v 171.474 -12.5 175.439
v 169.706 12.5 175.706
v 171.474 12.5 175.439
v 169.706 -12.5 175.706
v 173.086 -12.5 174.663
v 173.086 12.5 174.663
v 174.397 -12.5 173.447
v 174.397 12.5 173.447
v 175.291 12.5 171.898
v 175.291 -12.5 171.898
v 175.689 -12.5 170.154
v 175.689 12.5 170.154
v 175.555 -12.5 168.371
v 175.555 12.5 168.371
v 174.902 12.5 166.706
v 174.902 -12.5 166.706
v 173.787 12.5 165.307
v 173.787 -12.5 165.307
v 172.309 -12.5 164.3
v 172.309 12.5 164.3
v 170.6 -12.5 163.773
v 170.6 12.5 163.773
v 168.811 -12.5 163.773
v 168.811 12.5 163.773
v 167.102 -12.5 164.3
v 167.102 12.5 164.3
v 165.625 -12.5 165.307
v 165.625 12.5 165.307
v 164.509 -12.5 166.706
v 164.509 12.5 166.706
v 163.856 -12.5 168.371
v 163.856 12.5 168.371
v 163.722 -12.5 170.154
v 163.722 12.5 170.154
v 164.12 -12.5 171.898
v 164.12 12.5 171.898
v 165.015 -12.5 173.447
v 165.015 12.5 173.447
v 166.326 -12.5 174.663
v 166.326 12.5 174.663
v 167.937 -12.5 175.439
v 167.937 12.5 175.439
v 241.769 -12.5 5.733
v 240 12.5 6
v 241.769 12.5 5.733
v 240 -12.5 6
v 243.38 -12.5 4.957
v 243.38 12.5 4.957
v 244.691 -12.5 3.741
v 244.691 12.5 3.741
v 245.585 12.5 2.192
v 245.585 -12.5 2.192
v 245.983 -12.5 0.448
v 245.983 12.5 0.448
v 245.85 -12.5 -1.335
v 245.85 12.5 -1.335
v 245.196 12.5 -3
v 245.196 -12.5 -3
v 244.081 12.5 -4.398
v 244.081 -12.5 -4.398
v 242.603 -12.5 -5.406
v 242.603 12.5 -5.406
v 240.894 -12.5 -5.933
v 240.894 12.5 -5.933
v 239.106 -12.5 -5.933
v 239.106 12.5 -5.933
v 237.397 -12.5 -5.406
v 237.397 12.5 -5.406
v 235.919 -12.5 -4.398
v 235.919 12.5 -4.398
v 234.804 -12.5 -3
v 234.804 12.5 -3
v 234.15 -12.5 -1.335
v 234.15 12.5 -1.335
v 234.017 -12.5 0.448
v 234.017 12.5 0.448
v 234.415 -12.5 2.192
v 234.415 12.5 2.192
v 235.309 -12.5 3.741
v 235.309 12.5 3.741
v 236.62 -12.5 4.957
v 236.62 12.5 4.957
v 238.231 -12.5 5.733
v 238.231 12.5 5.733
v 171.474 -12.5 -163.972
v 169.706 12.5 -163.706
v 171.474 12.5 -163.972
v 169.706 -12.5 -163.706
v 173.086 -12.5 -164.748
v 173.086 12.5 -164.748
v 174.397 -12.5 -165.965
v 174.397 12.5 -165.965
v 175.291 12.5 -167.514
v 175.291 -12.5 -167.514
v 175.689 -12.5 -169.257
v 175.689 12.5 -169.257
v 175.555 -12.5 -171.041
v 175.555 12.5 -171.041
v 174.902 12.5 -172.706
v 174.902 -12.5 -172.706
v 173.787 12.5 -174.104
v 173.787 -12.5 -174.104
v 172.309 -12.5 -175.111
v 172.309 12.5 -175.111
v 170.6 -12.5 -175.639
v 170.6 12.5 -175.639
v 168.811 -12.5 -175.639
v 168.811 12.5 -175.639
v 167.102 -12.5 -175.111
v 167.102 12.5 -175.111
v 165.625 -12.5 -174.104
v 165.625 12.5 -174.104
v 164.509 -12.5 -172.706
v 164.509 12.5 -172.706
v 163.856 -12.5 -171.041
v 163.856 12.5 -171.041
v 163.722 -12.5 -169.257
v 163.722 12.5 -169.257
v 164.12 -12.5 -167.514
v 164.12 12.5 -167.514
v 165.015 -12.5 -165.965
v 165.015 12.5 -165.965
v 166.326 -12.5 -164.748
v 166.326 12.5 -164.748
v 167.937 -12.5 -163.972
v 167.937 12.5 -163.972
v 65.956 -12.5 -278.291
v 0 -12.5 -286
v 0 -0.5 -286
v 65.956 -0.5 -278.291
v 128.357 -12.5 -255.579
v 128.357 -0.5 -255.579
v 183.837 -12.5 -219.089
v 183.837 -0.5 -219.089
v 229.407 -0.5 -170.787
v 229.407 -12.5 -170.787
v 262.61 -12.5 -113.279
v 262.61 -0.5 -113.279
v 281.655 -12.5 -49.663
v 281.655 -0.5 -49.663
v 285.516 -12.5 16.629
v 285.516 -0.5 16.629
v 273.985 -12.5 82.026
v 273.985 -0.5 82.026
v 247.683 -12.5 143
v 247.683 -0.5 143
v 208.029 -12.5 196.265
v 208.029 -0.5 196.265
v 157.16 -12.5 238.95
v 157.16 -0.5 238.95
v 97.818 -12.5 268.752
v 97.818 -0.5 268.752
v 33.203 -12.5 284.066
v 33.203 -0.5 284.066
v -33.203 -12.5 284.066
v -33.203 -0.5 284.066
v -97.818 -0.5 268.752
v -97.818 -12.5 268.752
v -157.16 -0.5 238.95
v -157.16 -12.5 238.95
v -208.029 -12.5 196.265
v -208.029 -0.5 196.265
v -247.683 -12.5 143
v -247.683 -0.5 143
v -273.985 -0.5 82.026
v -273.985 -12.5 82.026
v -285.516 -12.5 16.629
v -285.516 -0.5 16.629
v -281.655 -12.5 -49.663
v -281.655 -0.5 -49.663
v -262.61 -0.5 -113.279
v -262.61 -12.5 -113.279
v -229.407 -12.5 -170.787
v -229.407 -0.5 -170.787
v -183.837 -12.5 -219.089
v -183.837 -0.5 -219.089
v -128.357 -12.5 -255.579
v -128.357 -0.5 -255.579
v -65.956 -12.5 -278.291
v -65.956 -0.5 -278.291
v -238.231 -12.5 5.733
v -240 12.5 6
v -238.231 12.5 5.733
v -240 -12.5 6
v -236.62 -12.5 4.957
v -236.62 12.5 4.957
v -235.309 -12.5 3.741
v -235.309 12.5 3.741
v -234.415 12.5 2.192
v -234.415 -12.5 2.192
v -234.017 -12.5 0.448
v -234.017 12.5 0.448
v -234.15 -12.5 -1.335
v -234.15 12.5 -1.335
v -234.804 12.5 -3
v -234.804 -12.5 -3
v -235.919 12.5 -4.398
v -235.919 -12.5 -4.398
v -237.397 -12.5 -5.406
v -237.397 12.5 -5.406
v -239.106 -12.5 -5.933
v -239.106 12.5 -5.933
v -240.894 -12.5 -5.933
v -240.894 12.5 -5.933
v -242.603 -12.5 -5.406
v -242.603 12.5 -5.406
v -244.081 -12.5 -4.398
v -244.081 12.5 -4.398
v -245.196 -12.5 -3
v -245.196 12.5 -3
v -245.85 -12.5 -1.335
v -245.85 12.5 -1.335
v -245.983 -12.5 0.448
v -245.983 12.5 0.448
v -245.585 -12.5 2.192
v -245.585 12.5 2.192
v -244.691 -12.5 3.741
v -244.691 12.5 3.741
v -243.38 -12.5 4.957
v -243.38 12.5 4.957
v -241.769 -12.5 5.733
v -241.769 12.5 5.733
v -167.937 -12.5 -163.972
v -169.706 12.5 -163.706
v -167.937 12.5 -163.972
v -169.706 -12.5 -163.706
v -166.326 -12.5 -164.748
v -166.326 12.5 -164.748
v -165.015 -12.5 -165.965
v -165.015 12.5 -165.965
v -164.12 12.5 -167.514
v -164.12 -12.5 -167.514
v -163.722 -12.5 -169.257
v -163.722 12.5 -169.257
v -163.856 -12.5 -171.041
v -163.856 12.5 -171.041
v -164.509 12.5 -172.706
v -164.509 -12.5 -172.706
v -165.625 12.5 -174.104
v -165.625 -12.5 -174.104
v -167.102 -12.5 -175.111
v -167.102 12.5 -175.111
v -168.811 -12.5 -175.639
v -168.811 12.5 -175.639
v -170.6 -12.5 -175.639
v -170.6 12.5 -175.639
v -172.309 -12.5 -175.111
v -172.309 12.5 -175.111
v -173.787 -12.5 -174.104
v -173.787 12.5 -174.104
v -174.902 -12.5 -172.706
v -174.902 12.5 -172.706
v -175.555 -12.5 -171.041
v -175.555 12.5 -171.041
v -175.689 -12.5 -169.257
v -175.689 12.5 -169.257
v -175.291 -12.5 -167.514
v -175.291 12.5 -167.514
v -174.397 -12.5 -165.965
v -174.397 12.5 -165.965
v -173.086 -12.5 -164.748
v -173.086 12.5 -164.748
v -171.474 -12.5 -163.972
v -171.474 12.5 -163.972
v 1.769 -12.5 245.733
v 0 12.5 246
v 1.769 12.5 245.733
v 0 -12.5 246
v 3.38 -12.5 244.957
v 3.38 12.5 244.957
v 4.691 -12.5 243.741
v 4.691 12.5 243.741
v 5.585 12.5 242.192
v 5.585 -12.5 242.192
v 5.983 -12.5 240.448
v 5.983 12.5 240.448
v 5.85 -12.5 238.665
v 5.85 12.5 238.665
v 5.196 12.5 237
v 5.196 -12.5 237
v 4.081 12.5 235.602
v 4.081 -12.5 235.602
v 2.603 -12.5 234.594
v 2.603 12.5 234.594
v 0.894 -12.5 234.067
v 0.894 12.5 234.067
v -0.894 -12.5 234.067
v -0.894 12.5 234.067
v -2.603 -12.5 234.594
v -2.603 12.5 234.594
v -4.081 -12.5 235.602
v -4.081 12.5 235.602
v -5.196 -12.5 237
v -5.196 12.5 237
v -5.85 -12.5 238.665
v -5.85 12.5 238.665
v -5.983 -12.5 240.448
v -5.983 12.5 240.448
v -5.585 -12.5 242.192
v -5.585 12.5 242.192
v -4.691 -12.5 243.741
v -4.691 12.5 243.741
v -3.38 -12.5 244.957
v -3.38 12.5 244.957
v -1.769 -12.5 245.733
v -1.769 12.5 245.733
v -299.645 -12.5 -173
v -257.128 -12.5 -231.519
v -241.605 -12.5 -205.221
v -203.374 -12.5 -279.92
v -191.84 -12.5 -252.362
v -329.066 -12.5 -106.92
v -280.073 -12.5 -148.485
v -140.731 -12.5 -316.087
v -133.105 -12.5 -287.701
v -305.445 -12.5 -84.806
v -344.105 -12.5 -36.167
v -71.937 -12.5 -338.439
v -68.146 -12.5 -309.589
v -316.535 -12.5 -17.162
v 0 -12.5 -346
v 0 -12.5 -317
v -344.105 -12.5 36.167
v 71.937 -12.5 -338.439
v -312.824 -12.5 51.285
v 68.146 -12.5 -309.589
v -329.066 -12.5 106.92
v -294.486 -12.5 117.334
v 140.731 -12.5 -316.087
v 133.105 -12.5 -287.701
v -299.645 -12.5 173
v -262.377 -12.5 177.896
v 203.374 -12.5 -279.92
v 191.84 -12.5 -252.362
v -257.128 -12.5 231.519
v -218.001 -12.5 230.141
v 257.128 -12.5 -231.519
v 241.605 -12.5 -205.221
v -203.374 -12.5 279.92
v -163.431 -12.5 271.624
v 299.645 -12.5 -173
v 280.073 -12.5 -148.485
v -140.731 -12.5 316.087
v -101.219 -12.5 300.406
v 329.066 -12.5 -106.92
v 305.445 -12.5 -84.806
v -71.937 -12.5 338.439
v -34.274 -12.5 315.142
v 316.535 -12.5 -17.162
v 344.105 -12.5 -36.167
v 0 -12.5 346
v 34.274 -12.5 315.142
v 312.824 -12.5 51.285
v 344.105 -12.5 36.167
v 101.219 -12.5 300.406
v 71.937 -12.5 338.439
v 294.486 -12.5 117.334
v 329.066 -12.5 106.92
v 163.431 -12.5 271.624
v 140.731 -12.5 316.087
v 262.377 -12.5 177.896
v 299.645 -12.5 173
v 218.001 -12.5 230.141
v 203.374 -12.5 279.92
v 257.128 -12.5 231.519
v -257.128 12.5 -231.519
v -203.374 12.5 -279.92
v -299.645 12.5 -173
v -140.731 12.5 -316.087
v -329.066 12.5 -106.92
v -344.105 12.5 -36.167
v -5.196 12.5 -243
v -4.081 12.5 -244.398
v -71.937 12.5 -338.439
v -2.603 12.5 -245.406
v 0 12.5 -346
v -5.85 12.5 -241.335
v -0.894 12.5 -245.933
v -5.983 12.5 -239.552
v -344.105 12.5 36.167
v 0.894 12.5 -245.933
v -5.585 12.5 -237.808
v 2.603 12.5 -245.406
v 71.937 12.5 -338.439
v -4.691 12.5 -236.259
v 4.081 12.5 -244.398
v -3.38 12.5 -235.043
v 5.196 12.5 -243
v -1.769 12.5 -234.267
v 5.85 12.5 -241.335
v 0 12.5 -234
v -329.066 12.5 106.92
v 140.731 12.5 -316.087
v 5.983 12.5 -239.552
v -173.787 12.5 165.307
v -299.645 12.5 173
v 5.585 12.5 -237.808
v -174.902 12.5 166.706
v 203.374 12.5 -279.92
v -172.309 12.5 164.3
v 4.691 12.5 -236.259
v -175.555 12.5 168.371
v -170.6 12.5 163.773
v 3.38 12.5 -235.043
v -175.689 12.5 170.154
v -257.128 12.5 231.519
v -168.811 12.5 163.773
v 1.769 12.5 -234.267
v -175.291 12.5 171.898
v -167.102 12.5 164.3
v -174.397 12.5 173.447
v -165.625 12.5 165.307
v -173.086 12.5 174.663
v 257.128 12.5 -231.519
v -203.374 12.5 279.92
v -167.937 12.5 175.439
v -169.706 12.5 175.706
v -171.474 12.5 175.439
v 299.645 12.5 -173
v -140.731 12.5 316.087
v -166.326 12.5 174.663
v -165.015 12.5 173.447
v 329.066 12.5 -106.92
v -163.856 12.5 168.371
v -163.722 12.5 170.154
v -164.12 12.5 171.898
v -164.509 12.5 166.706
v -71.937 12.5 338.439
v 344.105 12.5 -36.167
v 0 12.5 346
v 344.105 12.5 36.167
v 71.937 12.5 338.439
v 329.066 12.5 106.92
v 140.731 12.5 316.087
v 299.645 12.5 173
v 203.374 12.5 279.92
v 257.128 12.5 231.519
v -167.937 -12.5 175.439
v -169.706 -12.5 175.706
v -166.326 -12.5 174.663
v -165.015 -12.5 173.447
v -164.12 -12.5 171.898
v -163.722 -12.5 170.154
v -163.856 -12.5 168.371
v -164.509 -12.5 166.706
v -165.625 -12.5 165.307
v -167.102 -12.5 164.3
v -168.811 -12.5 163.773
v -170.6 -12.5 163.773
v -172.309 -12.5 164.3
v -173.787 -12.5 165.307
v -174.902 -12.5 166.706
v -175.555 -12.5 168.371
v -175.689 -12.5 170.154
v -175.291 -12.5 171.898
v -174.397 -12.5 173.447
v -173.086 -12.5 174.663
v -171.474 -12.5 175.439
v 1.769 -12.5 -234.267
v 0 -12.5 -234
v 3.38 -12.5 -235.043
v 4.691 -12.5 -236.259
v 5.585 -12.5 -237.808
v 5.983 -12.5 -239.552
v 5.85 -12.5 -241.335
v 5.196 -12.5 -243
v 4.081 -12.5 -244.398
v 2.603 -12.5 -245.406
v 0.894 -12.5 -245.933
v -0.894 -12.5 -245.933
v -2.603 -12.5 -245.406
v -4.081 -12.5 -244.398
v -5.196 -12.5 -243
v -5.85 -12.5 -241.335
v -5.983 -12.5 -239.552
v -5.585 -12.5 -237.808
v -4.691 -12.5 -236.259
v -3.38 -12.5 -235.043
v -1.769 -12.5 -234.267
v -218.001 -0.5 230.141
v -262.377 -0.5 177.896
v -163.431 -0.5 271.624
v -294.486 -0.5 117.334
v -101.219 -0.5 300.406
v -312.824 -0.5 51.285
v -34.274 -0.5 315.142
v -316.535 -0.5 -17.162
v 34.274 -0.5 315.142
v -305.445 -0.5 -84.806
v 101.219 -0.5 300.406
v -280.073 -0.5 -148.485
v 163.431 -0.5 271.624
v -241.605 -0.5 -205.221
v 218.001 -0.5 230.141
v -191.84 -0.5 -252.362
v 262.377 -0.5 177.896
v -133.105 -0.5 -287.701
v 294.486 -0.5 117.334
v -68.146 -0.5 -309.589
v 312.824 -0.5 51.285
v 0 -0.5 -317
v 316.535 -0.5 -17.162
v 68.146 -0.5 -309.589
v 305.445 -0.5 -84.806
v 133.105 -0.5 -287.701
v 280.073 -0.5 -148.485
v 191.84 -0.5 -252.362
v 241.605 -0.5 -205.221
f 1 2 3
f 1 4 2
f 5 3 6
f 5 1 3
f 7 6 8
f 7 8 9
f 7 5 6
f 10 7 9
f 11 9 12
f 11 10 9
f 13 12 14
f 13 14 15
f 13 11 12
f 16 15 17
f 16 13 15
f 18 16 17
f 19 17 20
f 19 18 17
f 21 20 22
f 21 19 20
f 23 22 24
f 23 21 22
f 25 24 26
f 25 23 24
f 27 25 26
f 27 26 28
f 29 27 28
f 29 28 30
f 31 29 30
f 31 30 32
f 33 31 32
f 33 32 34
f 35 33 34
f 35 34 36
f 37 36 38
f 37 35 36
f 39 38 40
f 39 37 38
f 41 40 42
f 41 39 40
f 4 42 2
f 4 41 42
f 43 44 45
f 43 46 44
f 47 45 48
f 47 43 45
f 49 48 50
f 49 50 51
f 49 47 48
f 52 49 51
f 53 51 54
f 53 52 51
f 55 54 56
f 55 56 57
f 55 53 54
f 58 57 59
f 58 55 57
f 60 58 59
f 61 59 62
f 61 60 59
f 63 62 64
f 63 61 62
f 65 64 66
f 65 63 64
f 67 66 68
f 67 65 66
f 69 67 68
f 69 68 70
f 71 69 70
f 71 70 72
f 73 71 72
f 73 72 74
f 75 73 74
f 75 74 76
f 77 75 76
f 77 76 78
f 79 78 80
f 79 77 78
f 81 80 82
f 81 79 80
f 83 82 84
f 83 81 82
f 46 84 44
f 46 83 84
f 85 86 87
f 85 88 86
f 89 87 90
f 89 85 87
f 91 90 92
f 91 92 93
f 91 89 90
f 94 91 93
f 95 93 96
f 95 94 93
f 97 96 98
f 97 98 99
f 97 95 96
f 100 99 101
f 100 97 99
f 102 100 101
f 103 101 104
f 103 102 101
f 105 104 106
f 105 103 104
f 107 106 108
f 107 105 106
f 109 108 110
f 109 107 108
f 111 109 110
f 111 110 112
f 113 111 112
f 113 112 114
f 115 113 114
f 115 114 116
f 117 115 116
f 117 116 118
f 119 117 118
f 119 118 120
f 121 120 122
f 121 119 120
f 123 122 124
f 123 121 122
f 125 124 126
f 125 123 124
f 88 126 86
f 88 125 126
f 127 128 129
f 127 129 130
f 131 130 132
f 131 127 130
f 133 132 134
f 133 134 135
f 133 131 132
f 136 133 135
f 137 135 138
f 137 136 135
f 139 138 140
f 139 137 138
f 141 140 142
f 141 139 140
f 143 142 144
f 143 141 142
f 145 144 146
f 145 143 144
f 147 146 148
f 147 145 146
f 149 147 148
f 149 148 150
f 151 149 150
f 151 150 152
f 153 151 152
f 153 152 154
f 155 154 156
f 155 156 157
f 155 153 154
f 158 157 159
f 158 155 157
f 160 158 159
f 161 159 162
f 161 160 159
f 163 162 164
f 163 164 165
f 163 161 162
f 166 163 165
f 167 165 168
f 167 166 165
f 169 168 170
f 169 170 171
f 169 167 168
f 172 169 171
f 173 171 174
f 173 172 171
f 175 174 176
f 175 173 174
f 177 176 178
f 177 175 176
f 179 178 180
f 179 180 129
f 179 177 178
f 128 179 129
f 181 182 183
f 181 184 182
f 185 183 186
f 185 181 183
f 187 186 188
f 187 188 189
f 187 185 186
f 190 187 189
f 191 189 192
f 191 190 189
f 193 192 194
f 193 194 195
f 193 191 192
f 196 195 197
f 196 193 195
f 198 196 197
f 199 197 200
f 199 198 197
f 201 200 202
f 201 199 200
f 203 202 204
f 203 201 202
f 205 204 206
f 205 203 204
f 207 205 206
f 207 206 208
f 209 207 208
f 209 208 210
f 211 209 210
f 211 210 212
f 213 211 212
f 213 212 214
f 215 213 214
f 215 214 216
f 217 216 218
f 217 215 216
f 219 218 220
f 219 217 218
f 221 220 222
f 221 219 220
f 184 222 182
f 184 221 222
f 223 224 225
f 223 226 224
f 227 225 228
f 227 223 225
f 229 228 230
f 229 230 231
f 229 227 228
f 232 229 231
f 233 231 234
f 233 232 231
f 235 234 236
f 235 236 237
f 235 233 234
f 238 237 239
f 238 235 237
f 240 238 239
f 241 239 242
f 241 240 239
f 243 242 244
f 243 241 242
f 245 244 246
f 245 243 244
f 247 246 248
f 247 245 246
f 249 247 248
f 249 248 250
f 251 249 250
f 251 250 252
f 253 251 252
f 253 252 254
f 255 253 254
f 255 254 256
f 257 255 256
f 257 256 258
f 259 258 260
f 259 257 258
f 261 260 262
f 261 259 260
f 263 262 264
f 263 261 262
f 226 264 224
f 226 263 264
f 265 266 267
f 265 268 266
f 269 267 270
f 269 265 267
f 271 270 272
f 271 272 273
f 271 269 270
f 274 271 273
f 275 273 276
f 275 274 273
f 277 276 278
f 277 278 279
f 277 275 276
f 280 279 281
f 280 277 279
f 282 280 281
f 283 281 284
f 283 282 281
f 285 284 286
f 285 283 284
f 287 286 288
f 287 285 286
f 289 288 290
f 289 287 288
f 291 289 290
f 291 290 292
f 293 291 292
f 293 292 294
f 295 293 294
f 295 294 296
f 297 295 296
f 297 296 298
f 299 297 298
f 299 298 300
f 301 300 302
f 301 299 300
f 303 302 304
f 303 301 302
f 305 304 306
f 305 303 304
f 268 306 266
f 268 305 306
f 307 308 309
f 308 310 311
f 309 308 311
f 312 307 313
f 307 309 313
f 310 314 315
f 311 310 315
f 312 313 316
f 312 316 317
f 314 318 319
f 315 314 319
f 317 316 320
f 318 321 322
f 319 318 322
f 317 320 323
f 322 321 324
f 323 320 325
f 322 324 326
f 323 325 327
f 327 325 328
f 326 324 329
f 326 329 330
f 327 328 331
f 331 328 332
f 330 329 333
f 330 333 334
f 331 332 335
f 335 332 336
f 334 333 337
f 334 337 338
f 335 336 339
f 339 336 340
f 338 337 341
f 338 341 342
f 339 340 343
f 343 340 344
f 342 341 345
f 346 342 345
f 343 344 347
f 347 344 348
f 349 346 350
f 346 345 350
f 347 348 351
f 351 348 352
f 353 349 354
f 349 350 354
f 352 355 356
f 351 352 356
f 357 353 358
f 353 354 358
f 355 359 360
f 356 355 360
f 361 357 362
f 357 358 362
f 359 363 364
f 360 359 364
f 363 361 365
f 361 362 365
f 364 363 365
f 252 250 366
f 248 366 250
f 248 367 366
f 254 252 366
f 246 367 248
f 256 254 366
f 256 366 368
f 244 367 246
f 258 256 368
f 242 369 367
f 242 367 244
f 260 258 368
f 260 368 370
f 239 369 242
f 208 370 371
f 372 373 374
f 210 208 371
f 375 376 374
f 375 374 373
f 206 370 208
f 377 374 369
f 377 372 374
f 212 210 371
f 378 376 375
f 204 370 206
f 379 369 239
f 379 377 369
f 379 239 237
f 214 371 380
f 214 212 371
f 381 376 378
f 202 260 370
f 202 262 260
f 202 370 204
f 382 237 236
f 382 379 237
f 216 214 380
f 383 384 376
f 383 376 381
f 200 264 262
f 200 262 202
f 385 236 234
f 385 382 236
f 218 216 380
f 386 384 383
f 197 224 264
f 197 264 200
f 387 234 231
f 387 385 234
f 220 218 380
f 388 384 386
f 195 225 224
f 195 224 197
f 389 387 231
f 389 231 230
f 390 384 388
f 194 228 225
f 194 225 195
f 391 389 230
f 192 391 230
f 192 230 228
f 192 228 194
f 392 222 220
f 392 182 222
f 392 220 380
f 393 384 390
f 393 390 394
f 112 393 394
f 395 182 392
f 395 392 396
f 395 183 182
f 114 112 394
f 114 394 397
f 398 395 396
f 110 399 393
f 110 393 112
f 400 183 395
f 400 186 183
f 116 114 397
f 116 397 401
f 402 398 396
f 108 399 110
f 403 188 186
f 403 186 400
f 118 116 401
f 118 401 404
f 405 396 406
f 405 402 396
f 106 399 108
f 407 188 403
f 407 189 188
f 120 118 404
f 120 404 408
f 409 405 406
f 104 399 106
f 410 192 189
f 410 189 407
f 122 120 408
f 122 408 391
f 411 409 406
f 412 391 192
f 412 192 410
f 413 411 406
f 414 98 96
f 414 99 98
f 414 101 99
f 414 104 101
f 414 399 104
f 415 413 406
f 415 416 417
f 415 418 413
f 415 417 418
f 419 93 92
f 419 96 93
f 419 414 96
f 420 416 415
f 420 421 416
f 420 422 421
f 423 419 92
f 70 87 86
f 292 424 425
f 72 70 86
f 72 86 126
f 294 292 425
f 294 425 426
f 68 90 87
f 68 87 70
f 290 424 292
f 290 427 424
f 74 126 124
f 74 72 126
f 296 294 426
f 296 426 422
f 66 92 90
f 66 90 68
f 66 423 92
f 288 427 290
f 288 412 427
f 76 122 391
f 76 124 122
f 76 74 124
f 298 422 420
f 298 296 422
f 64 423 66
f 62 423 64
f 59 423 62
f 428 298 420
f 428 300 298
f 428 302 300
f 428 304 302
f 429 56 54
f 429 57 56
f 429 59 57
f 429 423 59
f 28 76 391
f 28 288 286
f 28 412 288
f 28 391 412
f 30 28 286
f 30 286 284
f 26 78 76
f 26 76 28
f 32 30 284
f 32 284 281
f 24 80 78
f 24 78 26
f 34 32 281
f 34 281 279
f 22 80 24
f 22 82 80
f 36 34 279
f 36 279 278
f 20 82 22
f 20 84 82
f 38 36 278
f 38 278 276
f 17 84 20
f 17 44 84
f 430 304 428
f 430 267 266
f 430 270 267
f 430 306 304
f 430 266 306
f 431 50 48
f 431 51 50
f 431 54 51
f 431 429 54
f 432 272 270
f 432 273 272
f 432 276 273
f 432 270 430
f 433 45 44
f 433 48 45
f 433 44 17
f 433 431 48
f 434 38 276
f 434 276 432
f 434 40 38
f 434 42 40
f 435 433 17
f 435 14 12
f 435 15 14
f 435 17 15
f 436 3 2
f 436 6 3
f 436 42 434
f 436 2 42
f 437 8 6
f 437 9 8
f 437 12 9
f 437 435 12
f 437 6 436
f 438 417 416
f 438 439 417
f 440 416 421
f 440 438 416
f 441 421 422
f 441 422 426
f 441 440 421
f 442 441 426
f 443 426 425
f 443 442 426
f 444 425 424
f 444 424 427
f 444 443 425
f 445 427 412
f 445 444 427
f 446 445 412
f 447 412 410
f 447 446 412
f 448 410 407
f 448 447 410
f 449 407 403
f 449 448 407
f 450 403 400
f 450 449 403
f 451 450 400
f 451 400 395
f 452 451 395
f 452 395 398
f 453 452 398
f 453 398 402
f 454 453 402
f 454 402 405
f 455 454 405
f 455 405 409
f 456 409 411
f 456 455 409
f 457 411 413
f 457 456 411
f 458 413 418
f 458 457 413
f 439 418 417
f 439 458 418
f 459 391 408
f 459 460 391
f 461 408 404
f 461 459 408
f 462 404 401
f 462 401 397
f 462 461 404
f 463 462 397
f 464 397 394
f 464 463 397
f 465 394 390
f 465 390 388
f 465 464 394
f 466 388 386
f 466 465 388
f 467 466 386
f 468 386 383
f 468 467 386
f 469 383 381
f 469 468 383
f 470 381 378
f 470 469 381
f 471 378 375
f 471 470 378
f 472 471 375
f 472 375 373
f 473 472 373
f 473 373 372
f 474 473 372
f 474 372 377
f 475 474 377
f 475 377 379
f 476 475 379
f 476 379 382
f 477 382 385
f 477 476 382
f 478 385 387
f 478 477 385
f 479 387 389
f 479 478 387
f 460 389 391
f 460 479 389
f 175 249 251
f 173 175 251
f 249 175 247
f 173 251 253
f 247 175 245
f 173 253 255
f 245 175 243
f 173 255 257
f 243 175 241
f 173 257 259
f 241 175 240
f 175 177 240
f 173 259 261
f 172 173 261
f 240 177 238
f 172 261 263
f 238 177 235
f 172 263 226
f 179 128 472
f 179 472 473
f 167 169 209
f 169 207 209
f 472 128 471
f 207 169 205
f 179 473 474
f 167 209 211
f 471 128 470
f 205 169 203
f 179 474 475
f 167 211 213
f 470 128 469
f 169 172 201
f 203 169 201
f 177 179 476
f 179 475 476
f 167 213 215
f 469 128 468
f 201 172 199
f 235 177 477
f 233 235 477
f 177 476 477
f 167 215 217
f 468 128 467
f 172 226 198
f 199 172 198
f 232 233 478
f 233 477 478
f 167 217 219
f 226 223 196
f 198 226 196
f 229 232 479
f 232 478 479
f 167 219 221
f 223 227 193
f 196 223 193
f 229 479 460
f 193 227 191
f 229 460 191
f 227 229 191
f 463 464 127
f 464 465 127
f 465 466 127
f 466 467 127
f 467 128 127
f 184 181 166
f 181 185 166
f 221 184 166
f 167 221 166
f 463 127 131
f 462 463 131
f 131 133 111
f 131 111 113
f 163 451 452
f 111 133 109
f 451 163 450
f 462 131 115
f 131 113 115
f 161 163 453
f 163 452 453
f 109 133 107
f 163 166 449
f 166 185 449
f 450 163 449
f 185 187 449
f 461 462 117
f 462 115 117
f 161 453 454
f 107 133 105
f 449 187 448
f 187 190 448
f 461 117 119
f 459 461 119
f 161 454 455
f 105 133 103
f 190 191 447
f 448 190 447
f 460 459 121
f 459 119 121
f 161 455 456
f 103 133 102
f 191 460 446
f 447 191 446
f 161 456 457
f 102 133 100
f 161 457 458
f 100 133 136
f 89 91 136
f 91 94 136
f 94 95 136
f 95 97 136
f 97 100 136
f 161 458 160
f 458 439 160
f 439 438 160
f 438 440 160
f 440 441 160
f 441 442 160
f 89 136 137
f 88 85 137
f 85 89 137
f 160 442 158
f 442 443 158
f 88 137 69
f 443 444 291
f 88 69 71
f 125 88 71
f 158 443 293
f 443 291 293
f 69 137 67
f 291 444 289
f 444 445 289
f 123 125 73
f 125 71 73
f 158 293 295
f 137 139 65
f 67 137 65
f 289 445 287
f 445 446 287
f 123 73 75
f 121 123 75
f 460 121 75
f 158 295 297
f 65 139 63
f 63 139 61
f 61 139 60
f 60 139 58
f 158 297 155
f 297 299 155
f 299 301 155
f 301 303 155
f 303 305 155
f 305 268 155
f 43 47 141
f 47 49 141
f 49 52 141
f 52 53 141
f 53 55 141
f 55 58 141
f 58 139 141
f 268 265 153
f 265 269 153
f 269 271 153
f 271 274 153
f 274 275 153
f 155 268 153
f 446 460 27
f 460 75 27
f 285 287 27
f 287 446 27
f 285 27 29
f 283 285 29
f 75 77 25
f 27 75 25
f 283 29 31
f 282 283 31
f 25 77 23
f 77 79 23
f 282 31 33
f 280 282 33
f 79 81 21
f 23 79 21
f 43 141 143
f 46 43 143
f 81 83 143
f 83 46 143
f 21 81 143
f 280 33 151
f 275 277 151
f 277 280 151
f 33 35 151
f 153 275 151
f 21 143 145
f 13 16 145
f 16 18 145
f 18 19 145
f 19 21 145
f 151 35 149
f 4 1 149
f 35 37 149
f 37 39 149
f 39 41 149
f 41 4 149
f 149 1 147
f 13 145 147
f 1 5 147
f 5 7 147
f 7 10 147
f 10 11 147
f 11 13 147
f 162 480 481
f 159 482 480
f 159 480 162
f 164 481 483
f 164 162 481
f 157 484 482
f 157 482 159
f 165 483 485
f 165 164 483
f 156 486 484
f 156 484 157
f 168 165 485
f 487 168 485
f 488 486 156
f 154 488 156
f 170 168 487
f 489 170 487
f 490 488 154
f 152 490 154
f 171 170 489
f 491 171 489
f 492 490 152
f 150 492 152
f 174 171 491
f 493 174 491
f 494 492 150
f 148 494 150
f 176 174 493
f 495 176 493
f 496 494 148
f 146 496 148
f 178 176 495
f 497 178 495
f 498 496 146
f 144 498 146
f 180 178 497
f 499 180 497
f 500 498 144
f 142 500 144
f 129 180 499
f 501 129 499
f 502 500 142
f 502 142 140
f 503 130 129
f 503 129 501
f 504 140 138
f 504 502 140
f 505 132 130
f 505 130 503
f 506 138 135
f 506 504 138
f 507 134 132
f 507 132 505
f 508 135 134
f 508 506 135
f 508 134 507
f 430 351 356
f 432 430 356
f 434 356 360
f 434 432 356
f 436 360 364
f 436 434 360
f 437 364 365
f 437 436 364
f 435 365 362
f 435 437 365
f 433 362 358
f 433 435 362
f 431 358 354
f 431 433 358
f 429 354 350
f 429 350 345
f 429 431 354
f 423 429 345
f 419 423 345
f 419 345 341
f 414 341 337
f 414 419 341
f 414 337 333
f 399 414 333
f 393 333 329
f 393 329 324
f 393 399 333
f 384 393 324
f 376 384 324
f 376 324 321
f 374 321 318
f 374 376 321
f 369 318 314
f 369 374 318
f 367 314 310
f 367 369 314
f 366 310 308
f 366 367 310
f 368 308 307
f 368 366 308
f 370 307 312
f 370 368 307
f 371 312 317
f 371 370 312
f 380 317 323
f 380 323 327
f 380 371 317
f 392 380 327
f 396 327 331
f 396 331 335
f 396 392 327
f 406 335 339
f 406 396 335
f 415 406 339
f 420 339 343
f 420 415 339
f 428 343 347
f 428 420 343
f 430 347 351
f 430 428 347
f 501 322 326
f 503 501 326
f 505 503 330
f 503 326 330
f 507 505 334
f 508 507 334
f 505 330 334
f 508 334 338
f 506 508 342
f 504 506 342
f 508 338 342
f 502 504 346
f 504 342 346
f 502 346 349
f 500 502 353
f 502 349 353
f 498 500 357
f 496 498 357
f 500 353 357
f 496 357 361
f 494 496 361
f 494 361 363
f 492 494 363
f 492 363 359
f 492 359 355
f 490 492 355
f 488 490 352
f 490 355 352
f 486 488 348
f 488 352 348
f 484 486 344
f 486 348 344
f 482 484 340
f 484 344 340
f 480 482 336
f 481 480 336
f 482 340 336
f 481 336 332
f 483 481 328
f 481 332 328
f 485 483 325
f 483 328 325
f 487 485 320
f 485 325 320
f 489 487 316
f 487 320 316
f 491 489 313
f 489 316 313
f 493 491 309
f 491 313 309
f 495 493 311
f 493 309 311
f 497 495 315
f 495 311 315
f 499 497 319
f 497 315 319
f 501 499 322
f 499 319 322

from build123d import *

# Parameters (mm, degrees)
SKETCH1_R           = 346
SKETCH1_R_2         = 6
BOSS_EXTRUDE1_DEPTH = 12.5
SKETCH2_R           = 317
SKETCH2_R_2         = 286
CUT_EXTRUDE1_DEPTH  = 12


with BuildPart() as part:
    # Sketch1 → Boss-Extrude1 (new, symmetric)
    with BuildSketch(Plane(origin=(0, 0, 0), x_dir=(1, 0, 0), z_dir=(0, 1, 0))):
        with Locations(Location((0, 0, 0), (0, 0, 270))):
            Circle(SKETCH1_R)
        with Locations(Location((0, 240, 0), (0, 0, 270))):
            Circle(SKETCH1_R_2, mode=Mode.SUBTRACT)
        with Locations(Location((169.705627485, 169.705627485, 0), (0, 0, 270))):
            Circle(SKETCH1_R_2, mode=Mode.SUBTRACT)
        with Locations(Location((240, 0, 0), (0, 0, 270))):
            Circle(SKETCH1_R_2, mode=Mode.SUBTRACT)
        with Locations(Location((169.705627485, -169.705627485, 0), (0, 0, 270))):
            Circle(SKETCH1_R_2, mode=Mode.SUBTRACT)
        with Locations(Location((0, -240, 0), (0, 0, 270))):
            Circle(SKETCH1_R_2, mode=Mode.SUBTRACT)
        with Locations(Location((-169.705627485, -169.705627485, 0), (0, 0, 270))):
            Circle(SKETCH1_R_2, mode=Mode.SUBTRACT)
        with Locations(Location((-240, 0, 0), (0, 0, 270))):
            Circle(SKETCH1_R_2, mode=Mode.SUBTRACT)
        with Locations(Location((-169.705627485, 169.705627485, 0), (0, 0, 270))):
            Circle(SKETCH1_R_2, mode=Mode.SUBTRACT)
    extrude(amount=BOSS_EXTRUDE1_DEPTH, both=True)

    # Sketch2 → Cut-Extrude1 (cut)
    with BuildSketch(Plane.XZ.offset(12.5)):
        with Locations(Location((0, 0, 0), (0, 0, 270))):
            Circle(SKETCH2_R)
        with Locations(Location((0, 0, 0), (0, 0, 270))):
            Circle(SKETCH2_R_2, mode=Mode.SUBTRACT)
    extrude(amount=-CUT_EXTRUDE1_DEPTH, mode=Mode.SUBTRACT)


solid = part.part
